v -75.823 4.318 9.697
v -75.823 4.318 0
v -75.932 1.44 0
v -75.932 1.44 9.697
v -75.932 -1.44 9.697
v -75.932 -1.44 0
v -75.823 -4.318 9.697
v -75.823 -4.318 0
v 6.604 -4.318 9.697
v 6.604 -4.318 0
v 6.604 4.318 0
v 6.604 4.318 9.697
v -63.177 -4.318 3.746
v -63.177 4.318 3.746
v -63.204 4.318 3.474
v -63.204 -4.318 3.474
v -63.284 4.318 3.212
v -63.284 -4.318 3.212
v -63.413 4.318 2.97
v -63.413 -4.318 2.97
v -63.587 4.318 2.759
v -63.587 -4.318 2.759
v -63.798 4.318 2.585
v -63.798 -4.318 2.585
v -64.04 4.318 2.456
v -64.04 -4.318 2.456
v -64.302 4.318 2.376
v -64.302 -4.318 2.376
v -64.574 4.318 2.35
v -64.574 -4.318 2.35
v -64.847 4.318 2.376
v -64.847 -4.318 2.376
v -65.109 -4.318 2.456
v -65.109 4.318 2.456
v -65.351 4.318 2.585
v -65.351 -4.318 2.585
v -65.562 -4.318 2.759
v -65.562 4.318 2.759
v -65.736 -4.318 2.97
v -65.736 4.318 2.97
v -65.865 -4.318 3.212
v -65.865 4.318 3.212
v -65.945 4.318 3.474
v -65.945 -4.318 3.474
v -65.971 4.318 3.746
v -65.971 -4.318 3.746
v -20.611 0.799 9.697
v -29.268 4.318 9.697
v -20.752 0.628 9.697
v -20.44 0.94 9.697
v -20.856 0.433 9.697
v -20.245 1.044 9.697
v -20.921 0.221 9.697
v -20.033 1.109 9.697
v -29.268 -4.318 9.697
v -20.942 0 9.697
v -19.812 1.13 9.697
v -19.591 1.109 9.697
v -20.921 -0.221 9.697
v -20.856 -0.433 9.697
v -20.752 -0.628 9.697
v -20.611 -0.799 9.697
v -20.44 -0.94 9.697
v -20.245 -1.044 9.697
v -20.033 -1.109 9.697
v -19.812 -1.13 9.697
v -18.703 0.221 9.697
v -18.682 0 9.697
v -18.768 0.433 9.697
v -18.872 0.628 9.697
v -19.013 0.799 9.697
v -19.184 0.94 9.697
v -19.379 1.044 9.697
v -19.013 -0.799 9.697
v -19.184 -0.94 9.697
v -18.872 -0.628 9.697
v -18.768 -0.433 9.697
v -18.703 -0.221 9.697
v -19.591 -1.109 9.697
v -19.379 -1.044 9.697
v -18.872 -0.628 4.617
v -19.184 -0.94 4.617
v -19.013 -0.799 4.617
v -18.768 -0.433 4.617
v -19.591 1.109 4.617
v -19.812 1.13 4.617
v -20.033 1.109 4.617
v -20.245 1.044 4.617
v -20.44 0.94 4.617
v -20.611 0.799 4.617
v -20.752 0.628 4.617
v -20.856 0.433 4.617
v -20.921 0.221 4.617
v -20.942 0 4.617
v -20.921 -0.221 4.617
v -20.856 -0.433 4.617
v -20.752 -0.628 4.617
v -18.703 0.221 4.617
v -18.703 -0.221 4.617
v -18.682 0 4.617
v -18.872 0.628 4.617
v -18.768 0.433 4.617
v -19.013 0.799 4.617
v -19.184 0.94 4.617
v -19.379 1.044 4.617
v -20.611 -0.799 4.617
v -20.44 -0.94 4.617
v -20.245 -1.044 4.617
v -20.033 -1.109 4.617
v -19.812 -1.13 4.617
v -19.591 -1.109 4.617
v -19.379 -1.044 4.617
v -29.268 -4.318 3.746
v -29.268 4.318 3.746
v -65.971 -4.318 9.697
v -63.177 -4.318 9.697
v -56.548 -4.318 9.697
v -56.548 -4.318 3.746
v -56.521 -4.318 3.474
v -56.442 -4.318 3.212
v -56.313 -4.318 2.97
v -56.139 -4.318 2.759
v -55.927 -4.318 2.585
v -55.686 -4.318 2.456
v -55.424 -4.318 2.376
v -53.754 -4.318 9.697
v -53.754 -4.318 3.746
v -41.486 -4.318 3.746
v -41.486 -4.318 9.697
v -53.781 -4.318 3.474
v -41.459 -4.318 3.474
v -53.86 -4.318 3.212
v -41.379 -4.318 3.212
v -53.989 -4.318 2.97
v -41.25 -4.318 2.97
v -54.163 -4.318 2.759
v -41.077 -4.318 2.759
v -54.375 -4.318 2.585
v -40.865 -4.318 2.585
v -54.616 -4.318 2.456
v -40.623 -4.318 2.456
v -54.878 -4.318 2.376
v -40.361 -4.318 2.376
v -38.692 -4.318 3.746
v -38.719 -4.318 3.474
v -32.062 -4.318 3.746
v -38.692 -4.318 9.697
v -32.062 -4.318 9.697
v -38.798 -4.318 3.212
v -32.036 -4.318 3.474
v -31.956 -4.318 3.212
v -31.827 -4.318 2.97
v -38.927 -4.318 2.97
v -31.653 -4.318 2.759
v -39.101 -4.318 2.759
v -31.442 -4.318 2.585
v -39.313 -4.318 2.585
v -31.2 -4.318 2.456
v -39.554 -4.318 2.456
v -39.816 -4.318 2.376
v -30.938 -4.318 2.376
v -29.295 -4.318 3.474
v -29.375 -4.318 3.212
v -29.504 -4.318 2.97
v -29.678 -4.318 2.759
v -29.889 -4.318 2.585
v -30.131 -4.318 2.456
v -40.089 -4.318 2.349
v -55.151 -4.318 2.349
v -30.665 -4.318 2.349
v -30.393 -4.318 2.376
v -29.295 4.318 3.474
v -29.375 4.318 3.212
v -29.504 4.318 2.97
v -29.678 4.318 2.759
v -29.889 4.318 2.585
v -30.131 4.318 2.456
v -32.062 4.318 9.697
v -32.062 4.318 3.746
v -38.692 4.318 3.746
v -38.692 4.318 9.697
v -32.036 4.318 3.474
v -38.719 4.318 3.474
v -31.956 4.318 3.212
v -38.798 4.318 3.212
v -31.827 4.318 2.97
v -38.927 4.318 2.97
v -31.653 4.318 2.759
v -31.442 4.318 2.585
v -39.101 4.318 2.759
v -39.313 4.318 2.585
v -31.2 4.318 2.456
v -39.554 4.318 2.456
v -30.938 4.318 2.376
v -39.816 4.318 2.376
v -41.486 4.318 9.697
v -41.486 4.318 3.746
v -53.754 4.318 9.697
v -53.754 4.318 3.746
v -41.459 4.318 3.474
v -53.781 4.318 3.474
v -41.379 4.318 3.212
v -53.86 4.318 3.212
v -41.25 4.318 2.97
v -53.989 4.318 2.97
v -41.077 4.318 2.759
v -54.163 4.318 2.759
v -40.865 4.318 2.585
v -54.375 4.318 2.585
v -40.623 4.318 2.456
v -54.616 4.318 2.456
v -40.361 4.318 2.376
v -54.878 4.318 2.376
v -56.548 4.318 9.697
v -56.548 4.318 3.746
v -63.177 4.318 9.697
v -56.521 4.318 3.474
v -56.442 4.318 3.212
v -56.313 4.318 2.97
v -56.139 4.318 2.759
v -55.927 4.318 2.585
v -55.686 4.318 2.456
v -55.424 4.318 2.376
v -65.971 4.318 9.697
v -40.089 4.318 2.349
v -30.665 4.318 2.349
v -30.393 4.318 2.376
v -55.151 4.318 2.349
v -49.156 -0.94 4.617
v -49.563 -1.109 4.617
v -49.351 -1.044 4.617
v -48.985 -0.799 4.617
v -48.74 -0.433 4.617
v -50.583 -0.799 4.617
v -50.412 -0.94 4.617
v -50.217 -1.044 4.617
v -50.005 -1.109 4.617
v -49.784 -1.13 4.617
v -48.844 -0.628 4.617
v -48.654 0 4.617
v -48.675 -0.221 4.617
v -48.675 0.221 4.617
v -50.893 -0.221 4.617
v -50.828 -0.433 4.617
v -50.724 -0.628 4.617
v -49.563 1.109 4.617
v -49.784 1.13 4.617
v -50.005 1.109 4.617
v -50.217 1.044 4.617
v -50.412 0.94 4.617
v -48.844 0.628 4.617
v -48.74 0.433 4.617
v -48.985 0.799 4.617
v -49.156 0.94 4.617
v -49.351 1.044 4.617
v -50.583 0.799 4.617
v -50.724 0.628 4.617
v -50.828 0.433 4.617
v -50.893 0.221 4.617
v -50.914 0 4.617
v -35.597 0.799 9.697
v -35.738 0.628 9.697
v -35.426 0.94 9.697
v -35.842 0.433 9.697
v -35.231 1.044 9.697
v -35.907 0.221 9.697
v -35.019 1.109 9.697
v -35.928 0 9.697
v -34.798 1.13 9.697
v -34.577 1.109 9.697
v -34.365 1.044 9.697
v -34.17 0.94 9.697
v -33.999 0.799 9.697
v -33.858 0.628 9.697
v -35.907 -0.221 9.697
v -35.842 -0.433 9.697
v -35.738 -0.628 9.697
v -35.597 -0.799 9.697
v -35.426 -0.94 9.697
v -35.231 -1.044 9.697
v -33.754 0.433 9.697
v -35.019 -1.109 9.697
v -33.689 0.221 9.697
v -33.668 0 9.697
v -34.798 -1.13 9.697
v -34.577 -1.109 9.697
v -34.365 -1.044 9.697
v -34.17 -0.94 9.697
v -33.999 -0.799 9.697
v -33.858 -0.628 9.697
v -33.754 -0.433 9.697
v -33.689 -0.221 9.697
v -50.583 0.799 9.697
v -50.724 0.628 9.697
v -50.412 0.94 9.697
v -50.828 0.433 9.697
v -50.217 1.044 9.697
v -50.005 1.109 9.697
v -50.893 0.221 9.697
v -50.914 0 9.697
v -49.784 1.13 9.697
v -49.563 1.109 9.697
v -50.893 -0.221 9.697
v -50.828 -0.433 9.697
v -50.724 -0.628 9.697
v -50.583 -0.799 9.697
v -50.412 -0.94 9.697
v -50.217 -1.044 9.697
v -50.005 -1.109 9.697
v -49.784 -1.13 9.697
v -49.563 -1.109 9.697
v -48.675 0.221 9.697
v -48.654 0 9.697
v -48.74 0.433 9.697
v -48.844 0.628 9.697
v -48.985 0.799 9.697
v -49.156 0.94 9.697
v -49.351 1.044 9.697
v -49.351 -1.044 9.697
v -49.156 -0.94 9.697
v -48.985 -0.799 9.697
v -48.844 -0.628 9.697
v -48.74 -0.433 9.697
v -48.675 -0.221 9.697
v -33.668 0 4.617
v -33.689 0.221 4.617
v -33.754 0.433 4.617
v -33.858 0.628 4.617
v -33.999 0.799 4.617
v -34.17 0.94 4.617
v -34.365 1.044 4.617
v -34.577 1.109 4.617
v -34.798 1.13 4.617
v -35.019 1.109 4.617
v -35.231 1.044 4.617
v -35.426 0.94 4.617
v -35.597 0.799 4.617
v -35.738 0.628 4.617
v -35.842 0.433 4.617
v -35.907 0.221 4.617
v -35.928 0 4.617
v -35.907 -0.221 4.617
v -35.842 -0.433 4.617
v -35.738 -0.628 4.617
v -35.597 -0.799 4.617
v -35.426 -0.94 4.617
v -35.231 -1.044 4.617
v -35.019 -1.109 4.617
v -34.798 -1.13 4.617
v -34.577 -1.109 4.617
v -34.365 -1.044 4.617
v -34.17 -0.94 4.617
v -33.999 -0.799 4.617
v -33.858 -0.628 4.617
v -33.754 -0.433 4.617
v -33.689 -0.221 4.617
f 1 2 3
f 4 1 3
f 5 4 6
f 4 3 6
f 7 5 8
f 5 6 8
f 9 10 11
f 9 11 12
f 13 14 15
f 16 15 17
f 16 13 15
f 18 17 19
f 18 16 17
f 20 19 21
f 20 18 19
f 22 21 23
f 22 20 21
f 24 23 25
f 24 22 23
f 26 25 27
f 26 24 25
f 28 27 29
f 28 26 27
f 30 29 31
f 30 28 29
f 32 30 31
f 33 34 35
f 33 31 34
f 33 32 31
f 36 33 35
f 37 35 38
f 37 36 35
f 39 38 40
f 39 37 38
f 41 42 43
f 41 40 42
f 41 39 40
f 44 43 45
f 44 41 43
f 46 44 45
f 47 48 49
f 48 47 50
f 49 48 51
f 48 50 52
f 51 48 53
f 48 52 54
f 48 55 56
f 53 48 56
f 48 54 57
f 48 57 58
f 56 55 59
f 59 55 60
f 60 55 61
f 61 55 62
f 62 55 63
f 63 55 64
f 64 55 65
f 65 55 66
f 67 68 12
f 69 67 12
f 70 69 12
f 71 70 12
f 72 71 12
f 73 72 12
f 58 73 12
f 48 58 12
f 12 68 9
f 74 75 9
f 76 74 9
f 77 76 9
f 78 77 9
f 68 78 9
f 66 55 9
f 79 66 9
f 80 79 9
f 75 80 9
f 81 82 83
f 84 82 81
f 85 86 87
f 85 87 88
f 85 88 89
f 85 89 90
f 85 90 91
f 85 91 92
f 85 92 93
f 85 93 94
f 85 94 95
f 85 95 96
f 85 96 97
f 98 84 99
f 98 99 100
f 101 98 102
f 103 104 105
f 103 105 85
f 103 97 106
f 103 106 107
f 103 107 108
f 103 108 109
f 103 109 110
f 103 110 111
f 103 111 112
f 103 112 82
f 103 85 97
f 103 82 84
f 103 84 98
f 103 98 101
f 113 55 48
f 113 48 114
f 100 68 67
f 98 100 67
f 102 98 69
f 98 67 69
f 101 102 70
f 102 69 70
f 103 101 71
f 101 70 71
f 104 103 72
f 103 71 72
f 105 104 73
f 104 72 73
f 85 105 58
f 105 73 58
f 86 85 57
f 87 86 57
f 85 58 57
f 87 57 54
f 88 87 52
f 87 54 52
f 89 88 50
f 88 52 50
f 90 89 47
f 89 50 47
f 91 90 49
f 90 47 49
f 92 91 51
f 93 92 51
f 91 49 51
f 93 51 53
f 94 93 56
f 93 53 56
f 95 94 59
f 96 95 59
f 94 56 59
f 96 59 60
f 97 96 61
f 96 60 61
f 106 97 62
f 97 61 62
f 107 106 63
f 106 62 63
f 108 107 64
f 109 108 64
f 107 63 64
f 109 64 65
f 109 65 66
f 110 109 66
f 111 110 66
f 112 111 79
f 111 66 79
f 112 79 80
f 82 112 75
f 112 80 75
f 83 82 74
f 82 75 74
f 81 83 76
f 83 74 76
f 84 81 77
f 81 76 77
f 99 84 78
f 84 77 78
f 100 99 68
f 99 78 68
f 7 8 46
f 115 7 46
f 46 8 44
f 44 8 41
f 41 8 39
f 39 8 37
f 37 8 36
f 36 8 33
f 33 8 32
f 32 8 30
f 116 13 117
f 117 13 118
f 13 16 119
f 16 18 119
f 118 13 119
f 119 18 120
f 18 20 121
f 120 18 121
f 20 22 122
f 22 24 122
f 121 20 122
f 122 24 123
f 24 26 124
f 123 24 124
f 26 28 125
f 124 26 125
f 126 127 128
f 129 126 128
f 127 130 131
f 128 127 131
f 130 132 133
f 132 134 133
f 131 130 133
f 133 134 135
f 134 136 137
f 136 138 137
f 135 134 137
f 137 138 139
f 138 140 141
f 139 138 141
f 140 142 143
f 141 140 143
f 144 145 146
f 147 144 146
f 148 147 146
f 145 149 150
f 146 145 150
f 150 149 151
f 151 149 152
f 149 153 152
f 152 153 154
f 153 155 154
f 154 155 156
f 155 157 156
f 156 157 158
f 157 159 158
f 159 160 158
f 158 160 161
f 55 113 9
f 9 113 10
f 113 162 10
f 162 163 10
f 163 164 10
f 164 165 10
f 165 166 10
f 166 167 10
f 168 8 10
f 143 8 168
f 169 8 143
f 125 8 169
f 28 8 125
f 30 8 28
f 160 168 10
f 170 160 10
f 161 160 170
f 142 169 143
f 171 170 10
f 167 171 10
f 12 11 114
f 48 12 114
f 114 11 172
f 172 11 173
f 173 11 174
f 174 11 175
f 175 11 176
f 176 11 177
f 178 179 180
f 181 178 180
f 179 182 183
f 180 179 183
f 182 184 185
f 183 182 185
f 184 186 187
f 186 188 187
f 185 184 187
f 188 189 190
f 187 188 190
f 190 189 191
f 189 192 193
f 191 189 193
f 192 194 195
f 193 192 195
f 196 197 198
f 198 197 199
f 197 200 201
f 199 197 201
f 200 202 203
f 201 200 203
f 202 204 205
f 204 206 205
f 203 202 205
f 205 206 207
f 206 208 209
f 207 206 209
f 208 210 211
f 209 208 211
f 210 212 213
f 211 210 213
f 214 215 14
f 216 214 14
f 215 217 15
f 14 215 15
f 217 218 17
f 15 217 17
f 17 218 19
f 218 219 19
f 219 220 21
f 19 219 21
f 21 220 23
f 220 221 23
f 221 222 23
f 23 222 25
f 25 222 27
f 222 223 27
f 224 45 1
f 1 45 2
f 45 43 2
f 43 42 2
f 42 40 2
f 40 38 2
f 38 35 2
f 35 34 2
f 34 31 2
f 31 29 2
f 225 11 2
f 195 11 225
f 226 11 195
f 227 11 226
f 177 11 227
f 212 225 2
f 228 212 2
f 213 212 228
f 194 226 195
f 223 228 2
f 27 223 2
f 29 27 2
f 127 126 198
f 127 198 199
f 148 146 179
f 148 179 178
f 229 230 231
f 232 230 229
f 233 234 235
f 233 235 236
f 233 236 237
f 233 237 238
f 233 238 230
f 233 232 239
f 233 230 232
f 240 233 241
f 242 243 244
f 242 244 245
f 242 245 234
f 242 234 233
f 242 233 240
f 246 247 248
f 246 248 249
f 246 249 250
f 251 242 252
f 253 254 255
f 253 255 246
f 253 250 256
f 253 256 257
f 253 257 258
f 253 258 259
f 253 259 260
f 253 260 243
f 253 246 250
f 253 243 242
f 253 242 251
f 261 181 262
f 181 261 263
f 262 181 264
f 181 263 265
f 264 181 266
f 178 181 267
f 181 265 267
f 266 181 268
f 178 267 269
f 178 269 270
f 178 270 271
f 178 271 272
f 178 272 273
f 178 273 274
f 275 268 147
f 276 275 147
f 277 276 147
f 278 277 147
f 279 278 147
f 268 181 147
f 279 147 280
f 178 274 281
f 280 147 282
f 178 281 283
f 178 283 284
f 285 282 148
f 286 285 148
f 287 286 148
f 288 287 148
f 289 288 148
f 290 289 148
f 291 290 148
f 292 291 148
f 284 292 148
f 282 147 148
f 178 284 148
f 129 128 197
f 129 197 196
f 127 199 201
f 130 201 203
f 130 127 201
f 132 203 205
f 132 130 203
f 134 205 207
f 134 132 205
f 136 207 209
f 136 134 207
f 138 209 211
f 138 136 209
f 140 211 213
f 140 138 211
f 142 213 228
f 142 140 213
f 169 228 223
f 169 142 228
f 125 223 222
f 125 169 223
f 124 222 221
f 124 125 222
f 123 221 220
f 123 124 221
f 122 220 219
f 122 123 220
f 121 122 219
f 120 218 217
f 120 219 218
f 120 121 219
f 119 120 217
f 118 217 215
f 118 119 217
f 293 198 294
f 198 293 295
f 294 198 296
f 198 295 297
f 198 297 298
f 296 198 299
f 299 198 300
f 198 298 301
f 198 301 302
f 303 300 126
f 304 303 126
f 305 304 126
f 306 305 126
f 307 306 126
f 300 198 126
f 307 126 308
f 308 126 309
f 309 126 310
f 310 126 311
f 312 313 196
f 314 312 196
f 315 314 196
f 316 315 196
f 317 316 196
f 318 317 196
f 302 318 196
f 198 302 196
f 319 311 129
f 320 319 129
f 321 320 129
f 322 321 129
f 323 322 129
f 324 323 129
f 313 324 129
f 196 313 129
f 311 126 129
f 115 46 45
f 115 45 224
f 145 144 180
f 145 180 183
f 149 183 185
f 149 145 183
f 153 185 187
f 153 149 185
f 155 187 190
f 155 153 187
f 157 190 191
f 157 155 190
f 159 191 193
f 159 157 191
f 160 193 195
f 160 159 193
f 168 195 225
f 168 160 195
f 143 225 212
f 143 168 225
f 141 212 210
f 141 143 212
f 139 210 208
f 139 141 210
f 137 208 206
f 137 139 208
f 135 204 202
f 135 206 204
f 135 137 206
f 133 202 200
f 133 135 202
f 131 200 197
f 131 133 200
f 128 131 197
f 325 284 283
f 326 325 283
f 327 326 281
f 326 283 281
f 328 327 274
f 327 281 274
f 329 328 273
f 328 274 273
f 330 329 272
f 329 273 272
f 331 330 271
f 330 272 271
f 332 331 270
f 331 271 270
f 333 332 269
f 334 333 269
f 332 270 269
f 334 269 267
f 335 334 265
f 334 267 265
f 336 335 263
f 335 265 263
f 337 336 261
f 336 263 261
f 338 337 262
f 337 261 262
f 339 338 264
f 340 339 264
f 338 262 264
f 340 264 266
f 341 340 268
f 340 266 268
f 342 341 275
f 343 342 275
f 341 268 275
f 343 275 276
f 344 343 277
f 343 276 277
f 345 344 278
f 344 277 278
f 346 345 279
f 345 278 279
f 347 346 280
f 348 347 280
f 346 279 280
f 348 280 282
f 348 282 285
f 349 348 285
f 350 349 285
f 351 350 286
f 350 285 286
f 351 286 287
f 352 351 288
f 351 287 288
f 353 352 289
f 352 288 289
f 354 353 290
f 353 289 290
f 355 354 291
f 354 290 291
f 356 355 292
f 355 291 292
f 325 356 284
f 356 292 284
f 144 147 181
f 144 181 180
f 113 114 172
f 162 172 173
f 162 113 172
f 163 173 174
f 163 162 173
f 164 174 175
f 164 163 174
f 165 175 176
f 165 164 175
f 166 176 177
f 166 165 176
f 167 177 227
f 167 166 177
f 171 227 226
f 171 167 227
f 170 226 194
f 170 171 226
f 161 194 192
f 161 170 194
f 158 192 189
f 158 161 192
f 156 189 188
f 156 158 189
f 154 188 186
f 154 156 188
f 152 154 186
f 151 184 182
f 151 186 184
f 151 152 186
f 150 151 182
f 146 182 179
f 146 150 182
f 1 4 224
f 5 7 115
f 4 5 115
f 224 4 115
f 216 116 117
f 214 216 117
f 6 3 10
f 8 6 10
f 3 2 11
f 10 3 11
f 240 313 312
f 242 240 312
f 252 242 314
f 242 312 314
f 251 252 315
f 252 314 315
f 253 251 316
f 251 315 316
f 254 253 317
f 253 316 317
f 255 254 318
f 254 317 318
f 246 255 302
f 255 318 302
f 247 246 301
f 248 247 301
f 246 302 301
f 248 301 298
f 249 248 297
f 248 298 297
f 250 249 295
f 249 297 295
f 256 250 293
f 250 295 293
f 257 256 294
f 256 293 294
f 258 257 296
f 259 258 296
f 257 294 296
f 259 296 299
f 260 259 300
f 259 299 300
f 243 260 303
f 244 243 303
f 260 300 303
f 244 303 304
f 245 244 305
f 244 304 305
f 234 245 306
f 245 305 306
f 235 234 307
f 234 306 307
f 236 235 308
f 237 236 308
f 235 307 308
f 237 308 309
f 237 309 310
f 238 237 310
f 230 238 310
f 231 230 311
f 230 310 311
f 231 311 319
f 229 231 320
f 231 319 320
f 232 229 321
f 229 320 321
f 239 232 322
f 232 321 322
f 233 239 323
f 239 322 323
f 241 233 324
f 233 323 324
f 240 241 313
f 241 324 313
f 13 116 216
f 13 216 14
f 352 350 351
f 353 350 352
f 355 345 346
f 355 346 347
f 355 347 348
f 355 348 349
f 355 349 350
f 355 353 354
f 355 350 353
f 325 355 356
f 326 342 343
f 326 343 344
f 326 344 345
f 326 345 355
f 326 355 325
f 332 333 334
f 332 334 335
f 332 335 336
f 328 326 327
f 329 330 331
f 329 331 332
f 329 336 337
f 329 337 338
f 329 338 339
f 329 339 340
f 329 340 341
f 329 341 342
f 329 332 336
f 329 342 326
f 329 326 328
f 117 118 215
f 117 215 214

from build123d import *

# Parameters (mm, degrees)
BOSS_EXTRUDE2_DEPTH = 13.97
CUT_EXTRUDE1_DEPTH  = 9.636
SKETCH4_W           = 0.89408
SKETCH4_H           = 14.808934263
CUT_EXTRUDE2_DEPTH  = 9.636
SKETCH5_W           = 110.36886563
SKETCH5_H           = 6.670389245
CUT_EXTRUDE3_DEPTH  = 9.636
SKETCH6_R           = 1.1303
CUT_EXTRUDE4_DEPTH  = 5.08


with BuildPart() as part:
    # Sketch2 → Boss-Extrude2 (new body)
    with BuildSketch(Plane.XY):
        with BuildLine():
            Line((7.49808, 4.318), (-75.823148128, 4.318))
            ThreePointArc((-75.823148128, 4.318), (-75.946, 0), (-75.823148128, -4.318))
            Line((-75.823148128, -4.318), (7.49808, -4.318))
            Line((7.49808, -4.318), (7.49808, 4.318))
        make_face()
    extrude(amount=BOSS_EXTRUDE2_DEPTH)

    # Sketch3 → Cut-Extrude1 (cut, through all)
    with BuildSketch(Plane(origin=(0, -4.318, 0), x_dir=(-1, 0, 0), z_dir=(0, -1, 0))):
        with BuildLine():
            Line((63.17742, -10.2235), (63.17742, -3.7465))
            ThreePointArc((63.17742, -3.7465), (64.57442, -2.3495), (65.97142, -3.7465))
            Line((65.97142, -3.7465), (65.97142, -10.2235))
            ThreePointArc((65.97142, -10.2235), (64.57442, -11.6205), (63.17742, -10.2235))
        make_face()
        with BuildLine():
            Line((29.26842, -10.2235), (29.26842, -3.7465))
            ThreePointArc((29.26842, -3.7465), (30.66542, -2.3495), (32.06242, -3.7465))
            Line((32.06242, -3.7465), (32.06242, -10.2235))
            ThreePointArc((32.06242, -10.2235), (30.66542, -11.6205), (29.26842, -10.2235))
        make_face()
        with BuildLine():
            Line((38.69182, -10.2235), (38.69182, -3.7465))
            ThreePointArc((38.69182, -3.7465), (40.08882, -2.3495), (41.48582, -3.7465))
            Line((41.48582, -3.7465), (41.48582, -10.2235))
            ThreePointArc((41.48582, -10.2235), (40.08882, -11.6205), (38.69182, -10.2235))
        make_face()
        with BuildLine():
            Line((53.75402, -10.2235), (53.75402, -3.7465))
            ThreePointArc((53.75402, -3.7465), (55.15102, -2.3495), (56.54802, -3.7465))
            Line((56.54802, -3.7465), (56.54802, -10.2235))
            ThreePointArc((56.54802, -10.2235), (55.15102, -11.6205), (53.75402, -10.2235))
        make_face()
    extrude(amount=-CUT_EXTRUDE1_DEPTH, mode=Mode.SUBTRACT)

    # Sketch4 → Cut-Extrude2 (cut, through all)
    with BuildSketch(Plane.XZ.offset(4.318)):
        with Locations((7.05104, 6.565532869)):
            Rectangle(SKETCH4_W, SKETCH4_H)
    extrude(amount=-CUT_EXTRUDE2_DEPTH, mode=Mode.SUBTRACT)

    # Sketch5 → Cut-Extrude3 (cut, through all)
    with BuildSketch(Plane.XZ.offset(4.318)):
        with Locations((-32.153676927, 13.032670326)):
            Rectangle(SKETCH5_W, SKETCH5_H)
    extrude(amount=-CUT_EXTRUDE3_DEPTH, mode=Mode.SUBTRACT)

    # Sketch6 → Cut-Extrude4 (cut)
    with BuildSketch(Plane.XY.offset(9.697475704)):
        with Locations((-49.784, 0)):
            Circle(SKETCH6_R)
        with Locations((-34.798, 0)):
            Circle(SKETCH6_R)
        with Locations((-19.812, 0)):
            Circle(SKETCH6_R)
    extrude(amount=-CUT_EXTRUDE4_DEPTH, mode=Mode.SUBTRACT)


solid = part.part
